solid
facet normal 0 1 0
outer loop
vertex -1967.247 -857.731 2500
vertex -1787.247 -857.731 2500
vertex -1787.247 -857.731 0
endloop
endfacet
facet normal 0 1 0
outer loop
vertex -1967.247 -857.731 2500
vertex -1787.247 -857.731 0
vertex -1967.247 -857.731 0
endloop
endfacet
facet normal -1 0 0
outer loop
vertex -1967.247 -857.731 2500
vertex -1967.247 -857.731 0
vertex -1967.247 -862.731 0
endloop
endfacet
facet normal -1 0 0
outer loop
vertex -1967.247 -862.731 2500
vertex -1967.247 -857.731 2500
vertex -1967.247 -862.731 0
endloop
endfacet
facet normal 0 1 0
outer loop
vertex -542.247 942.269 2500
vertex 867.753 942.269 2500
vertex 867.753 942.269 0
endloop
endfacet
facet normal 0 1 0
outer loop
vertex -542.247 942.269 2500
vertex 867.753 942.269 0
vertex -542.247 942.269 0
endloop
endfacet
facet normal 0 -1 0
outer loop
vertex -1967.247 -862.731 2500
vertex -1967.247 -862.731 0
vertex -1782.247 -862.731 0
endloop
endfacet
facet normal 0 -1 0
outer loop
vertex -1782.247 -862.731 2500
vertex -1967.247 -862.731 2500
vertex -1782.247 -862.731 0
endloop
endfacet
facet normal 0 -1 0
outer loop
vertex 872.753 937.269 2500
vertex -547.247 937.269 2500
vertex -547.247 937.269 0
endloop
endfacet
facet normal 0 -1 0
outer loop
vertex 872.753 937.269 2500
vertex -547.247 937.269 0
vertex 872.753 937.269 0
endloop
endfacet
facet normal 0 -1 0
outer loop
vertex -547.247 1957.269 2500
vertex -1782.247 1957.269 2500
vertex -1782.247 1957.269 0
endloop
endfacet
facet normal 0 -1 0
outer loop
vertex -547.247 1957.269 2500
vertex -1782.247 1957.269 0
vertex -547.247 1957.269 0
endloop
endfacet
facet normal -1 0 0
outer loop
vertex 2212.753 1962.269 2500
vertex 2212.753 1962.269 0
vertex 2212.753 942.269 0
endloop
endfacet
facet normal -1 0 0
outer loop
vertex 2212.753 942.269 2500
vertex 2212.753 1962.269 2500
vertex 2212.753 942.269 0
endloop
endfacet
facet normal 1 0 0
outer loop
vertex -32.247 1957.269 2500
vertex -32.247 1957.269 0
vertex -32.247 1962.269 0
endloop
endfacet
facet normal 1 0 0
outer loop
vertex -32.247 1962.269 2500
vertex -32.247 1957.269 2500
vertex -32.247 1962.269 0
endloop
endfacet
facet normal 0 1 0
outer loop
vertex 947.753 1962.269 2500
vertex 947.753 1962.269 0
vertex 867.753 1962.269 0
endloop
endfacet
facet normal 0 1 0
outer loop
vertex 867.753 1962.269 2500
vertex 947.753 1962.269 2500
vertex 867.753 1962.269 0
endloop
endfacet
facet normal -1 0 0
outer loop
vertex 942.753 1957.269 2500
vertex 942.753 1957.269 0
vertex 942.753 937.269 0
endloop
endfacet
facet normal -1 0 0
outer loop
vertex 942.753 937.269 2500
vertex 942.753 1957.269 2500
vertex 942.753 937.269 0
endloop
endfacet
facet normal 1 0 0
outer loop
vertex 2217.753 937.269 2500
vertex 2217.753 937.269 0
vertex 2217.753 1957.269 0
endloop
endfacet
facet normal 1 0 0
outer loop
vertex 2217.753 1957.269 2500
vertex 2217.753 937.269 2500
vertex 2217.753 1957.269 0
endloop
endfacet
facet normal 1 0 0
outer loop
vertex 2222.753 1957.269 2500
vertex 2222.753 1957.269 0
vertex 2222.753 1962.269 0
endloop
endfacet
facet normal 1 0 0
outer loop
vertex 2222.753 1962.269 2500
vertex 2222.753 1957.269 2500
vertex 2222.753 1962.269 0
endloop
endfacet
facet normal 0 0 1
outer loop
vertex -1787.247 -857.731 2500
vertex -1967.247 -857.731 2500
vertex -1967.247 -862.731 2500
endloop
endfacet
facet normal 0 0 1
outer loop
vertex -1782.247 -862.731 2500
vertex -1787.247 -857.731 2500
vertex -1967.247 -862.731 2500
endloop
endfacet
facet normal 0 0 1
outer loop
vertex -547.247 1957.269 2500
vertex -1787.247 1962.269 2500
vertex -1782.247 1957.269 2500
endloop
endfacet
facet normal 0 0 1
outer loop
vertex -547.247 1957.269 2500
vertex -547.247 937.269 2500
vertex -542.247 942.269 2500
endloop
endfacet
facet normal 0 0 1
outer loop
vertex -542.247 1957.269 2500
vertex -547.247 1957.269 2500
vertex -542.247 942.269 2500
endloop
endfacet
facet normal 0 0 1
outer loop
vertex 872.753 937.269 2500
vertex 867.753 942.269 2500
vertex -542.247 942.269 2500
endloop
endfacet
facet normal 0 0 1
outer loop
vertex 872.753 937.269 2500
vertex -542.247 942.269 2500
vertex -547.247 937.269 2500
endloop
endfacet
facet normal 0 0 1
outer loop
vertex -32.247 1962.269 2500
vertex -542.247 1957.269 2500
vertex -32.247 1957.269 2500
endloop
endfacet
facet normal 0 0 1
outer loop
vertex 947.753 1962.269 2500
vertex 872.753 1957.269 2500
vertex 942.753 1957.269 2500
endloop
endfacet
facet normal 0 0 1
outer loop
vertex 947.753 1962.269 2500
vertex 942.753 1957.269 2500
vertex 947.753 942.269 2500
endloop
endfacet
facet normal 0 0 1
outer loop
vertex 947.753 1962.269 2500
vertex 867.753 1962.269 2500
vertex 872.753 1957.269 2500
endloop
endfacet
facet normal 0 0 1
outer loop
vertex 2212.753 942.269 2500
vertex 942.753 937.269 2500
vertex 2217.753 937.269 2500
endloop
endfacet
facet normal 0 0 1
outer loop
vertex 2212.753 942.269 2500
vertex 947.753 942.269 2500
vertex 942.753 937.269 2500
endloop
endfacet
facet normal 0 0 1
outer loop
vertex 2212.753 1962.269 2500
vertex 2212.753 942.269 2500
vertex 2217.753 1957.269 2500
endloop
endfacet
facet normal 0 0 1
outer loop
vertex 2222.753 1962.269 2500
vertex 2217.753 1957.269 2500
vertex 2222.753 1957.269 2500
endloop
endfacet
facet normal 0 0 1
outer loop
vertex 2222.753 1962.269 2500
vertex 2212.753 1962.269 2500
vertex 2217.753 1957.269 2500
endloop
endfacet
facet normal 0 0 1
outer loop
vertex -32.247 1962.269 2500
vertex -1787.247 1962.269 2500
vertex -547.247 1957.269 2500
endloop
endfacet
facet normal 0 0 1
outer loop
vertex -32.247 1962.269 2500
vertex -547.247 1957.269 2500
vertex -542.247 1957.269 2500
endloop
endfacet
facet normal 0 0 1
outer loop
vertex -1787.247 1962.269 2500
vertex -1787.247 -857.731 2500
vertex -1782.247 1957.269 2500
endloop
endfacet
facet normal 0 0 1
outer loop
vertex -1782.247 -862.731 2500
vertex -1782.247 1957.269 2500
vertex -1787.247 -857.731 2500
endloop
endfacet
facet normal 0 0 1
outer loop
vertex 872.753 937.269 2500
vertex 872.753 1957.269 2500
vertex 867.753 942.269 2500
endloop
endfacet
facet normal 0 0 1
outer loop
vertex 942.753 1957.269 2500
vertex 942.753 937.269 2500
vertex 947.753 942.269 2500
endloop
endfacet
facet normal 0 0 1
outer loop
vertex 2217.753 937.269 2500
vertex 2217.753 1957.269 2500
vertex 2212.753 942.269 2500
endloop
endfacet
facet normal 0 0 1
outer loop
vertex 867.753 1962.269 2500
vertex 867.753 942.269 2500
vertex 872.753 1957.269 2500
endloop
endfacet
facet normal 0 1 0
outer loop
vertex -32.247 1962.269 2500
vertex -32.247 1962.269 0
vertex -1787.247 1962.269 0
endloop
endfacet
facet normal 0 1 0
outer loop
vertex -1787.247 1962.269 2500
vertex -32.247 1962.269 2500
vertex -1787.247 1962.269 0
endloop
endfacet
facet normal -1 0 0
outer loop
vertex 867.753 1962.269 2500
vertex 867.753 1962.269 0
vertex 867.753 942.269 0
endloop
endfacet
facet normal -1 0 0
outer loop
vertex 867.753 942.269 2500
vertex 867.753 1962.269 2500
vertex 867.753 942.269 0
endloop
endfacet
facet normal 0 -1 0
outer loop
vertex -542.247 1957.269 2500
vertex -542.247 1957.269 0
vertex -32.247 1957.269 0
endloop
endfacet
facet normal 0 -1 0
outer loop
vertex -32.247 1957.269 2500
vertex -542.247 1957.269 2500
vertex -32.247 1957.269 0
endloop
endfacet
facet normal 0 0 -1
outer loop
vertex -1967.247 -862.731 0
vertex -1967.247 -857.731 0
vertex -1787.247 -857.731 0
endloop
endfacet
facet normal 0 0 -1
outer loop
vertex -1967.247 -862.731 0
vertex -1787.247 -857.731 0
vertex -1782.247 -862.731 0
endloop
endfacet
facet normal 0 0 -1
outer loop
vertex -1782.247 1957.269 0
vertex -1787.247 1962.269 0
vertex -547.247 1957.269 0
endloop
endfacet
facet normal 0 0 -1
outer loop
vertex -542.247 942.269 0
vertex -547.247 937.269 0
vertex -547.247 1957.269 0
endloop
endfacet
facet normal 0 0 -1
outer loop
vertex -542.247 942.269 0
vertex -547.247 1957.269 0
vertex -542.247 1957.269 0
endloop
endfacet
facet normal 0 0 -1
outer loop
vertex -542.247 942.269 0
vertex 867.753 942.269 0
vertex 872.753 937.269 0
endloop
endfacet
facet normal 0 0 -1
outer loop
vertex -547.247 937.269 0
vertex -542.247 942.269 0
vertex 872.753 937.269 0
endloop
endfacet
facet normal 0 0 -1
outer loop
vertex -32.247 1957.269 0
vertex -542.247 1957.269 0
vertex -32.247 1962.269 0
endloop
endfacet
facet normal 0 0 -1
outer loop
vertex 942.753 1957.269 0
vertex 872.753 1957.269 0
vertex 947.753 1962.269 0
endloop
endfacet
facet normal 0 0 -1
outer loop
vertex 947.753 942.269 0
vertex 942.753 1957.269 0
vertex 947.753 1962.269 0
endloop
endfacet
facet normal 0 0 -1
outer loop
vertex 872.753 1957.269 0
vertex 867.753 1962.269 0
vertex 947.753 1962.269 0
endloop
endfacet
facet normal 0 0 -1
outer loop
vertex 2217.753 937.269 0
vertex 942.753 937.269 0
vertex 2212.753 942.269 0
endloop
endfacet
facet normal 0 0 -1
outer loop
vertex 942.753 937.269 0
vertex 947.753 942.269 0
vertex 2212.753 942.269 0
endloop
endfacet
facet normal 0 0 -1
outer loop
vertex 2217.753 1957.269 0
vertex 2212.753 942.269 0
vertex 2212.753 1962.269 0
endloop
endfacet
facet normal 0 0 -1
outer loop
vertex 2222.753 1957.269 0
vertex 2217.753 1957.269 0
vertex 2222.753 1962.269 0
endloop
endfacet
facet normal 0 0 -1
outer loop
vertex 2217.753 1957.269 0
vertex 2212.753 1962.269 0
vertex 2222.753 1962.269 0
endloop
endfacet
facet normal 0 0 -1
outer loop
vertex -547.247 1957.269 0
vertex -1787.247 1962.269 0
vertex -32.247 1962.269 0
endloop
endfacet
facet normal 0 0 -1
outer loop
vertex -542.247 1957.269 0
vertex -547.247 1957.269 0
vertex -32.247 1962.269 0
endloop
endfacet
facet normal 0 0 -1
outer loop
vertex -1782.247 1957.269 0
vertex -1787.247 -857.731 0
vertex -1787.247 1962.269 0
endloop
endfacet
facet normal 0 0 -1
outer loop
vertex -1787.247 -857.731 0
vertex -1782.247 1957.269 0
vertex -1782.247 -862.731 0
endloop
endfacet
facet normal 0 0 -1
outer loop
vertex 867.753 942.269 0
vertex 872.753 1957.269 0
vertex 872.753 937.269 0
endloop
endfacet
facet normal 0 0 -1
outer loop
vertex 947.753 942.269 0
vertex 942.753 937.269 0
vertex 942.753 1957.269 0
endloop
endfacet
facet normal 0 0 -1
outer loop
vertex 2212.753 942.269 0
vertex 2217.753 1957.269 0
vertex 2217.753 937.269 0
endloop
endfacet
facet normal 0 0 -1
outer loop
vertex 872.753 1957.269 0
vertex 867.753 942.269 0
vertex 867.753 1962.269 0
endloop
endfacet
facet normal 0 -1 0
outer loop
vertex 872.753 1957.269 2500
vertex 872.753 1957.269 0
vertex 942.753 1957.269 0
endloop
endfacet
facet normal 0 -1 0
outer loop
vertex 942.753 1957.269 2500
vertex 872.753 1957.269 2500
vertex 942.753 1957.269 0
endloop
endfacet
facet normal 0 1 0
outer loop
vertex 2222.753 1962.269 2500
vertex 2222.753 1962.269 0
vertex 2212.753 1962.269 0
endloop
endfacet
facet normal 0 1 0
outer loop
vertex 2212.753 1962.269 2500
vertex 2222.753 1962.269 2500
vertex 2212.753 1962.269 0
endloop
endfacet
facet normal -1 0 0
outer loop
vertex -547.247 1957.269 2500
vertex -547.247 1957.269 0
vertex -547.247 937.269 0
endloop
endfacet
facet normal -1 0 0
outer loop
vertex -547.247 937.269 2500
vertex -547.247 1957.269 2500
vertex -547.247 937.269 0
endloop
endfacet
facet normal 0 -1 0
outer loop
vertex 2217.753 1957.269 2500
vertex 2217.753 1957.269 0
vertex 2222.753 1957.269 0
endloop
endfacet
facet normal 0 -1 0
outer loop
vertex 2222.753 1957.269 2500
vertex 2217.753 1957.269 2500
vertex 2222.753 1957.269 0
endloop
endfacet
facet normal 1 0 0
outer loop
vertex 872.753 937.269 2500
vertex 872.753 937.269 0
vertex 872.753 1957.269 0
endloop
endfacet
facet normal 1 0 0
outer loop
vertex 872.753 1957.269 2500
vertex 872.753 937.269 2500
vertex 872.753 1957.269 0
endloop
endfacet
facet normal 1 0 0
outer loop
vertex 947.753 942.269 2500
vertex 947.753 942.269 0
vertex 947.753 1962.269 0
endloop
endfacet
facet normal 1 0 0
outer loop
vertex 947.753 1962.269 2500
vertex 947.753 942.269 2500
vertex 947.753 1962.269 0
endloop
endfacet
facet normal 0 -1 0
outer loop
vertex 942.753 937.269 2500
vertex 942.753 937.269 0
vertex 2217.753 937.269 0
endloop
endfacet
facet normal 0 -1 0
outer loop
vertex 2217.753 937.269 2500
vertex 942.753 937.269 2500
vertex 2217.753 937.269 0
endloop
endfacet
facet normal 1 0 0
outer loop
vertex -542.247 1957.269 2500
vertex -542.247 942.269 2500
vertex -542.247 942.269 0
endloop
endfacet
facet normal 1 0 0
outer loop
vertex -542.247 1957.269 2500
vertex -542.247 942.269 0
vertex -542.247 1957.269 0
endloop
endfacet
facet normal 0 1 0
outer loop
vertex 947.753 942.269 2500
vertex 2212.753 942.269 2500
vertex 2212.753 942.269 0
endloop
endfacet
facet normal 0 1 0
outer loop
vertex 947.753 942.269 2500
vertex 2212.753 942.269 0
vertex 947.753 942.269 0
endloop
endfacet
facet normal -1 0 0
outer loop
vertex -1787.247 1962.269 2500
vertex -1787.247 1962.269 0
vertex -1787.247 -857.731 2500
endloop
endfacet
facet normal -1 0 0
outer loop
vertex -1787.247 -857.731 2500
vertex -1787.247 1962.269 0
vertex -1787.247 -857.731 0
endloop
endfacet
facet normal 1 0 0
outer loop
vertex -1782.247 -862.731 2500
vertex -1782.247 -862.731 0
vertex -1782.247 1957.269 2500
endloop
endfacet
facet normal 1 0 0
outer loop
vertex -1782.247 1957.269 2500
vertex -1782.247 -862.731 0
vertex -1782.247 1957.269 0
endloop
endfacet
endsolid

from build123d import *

# Parameters (mm, degrees)
F0_W     = 510
F0_H     = 5
F1_DEPTH = 2500


# Not quite as in the source:
# - a feature names something its author has since deleted; it is built from what else it names


with BuildPart() as f1:
    # F0 (on Top) → F1 (new body)
    with BuildSketch(Plane.XY):
        Polygon((867.7531446819, 942.2693800055), (-542.2468553181, 942.2693800055), (-542.2468553181, 1957.2693800055), (-542.2468553181, 1962.2693800055), (-1787.2468553181, 1962.2693800055), (-1787.2468553181, -857.7306199945), (-1967.2468553181, -857.7306199945), (-1967.2468553181, -862.7306199945), (-1782.2468553181, -862.7306199945), (-1782.2468553181, 1957.2693800055), (-547.2468553181, 1957.2693800055), (-547.2468553181, 937.2693800055), (872.7531446819, 937.2693800055), (872.7531446819, 1957.2693800055), (942.7531446819, 1957.2693800055), (942.7531446819, 937.2693800055), (2217.7531446819, 937.2693800055), (2217.7531446819, 1957.2693800055), (2222.7531446819, 1957.2693800055), (2222.7531446819, 1962.2693800055), (2212.7531446819, 1962.2693800055), (2212.7531446819, 942.2693800055), (947.7531446819, 942.2693800055), (947.7531446819, 1962.2693800055), (867.7531446819, 1962.2693800055), align=None)
        with Locations((-287.2468553181, 1959.7693800055)):
            Rectangle(F0_W, F0_H)
    extrude(amount=F1_DEPTH)


solid = f1.part
